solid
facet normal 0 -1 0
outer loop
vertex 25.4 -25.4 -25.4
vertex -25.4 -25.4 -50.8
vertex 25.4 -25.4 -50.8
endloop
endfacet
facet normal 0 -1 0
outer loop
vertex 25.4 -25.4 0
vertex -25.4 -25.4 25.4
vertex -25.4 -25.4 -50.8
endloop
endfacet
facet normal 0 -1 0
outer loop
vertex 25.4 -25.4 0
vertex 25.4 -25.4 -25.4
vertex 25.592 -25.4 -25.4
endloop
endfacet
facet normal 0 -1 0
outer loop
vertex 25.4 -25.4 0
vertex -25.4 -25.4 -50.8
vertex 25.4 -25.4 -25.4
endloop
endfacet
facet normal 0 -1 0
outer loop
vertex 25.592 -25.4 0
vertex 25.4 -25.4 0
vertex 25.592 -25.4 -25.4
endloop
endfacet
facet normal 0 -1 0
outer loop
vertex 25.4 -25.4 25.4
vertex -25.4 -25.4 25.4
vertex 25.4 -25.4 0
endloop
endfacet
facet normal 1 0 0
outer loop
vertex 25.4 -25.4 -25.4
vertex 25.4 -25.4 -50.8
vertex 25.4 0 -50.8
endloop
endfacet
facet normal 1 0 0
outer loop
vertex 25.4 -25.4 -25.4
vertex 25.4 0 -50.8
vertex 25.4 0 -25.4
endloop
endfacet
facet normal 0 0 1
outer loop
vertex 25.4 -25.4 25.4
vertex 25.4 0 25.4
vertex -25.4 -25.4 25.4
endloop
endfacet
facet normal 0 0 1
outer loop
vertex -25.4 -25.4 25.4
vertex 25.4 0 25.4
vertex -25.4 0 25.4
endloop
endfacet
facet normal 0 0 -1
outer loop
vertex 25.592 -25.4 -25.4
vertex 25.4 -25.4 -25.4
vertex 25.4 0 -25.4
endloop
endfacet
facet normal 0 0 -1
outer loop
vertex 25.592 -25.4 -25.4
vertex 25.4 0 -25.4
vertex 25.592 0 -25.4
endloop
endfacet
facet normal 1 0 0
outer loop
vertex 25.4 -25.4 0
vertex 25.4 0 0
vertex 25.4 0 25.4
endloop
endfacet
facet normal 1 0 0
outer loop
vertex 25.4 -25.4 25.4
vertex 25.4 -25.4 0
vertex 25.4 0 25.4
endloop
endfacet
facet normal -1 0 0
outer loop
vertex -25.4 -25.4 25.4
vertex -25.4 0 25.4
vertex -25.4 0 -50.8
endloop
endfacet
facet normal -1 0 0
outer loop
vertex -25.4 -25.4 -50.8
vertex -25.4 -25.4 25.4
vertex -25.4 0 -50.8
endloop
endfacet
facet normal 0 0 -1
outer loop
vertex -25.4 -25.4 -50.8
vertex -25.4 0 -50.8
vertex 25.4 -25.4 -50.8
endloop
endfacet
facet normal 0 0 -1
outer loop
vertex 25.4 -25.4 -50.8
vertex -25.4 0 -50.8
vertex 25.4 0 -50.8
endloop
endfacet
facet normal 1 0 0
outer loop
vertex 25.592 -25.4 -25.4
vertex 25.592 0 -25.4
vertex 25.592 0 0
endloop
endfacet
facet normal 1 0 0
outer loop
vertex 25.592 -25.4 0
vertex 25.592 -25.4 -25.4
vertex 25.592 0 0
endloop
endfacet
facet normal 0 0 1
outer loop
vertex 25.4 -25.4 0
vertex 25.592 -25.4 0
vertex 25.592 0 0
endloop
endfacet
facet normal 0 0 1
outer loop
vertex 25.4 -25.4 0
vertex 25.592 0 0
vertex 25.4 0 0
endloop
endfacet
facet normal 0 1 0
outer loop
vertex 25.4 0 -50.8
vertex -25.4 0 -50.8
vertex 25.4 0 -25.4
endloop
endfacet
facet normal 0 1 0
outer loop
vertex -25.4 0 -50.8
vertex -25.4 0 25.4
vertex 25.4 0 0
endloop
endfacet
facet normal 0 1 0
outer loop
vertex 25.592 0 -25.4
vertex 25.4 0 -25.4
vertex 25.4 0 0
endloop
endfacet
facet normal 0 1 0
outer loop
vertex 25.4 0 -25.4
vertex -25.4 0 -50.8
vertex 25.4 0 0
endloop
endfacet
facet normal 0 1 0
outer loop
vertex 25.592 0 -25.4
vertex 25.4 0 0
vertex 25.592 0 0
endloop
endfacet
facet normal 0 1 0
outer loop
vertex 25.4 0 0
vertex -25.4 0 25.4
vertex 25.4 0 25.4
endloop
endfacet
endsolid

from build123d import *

# Parameters (mm, degrees)
F0_W     = 25.4
F0_H     = 25.4
F1_DEPTH = 25.4


with BuildPart() as f1:
    # F0 (on Front) → F1 (new body)
    with BuildSketch(Plane.XZ):
        with Locations((12.7, 12.7)):
            Rectangle(F0_W, F0_H)
        with Locations((-12.7, 12.7)):
            Rectangle(F0_W, F0_H)
        with Locations((-12.7, -12.7)):
            Rectangle(F0_W, F0_H)
        Polygon((25.4, 0), (0, 0), (0, -25.4), (25.4, -25.4), (25.591951, -25.4), (25.591951, 0), align=None)
        with Locations((-12.7, -38.1)):
            Rectangle(F0_W, F0_H)
        with Locations((12.7, -38.1)):
            Rectangle(F0_W, F0_H)
    extrude(amount=F1_DEPTH)


solid = f1.part
